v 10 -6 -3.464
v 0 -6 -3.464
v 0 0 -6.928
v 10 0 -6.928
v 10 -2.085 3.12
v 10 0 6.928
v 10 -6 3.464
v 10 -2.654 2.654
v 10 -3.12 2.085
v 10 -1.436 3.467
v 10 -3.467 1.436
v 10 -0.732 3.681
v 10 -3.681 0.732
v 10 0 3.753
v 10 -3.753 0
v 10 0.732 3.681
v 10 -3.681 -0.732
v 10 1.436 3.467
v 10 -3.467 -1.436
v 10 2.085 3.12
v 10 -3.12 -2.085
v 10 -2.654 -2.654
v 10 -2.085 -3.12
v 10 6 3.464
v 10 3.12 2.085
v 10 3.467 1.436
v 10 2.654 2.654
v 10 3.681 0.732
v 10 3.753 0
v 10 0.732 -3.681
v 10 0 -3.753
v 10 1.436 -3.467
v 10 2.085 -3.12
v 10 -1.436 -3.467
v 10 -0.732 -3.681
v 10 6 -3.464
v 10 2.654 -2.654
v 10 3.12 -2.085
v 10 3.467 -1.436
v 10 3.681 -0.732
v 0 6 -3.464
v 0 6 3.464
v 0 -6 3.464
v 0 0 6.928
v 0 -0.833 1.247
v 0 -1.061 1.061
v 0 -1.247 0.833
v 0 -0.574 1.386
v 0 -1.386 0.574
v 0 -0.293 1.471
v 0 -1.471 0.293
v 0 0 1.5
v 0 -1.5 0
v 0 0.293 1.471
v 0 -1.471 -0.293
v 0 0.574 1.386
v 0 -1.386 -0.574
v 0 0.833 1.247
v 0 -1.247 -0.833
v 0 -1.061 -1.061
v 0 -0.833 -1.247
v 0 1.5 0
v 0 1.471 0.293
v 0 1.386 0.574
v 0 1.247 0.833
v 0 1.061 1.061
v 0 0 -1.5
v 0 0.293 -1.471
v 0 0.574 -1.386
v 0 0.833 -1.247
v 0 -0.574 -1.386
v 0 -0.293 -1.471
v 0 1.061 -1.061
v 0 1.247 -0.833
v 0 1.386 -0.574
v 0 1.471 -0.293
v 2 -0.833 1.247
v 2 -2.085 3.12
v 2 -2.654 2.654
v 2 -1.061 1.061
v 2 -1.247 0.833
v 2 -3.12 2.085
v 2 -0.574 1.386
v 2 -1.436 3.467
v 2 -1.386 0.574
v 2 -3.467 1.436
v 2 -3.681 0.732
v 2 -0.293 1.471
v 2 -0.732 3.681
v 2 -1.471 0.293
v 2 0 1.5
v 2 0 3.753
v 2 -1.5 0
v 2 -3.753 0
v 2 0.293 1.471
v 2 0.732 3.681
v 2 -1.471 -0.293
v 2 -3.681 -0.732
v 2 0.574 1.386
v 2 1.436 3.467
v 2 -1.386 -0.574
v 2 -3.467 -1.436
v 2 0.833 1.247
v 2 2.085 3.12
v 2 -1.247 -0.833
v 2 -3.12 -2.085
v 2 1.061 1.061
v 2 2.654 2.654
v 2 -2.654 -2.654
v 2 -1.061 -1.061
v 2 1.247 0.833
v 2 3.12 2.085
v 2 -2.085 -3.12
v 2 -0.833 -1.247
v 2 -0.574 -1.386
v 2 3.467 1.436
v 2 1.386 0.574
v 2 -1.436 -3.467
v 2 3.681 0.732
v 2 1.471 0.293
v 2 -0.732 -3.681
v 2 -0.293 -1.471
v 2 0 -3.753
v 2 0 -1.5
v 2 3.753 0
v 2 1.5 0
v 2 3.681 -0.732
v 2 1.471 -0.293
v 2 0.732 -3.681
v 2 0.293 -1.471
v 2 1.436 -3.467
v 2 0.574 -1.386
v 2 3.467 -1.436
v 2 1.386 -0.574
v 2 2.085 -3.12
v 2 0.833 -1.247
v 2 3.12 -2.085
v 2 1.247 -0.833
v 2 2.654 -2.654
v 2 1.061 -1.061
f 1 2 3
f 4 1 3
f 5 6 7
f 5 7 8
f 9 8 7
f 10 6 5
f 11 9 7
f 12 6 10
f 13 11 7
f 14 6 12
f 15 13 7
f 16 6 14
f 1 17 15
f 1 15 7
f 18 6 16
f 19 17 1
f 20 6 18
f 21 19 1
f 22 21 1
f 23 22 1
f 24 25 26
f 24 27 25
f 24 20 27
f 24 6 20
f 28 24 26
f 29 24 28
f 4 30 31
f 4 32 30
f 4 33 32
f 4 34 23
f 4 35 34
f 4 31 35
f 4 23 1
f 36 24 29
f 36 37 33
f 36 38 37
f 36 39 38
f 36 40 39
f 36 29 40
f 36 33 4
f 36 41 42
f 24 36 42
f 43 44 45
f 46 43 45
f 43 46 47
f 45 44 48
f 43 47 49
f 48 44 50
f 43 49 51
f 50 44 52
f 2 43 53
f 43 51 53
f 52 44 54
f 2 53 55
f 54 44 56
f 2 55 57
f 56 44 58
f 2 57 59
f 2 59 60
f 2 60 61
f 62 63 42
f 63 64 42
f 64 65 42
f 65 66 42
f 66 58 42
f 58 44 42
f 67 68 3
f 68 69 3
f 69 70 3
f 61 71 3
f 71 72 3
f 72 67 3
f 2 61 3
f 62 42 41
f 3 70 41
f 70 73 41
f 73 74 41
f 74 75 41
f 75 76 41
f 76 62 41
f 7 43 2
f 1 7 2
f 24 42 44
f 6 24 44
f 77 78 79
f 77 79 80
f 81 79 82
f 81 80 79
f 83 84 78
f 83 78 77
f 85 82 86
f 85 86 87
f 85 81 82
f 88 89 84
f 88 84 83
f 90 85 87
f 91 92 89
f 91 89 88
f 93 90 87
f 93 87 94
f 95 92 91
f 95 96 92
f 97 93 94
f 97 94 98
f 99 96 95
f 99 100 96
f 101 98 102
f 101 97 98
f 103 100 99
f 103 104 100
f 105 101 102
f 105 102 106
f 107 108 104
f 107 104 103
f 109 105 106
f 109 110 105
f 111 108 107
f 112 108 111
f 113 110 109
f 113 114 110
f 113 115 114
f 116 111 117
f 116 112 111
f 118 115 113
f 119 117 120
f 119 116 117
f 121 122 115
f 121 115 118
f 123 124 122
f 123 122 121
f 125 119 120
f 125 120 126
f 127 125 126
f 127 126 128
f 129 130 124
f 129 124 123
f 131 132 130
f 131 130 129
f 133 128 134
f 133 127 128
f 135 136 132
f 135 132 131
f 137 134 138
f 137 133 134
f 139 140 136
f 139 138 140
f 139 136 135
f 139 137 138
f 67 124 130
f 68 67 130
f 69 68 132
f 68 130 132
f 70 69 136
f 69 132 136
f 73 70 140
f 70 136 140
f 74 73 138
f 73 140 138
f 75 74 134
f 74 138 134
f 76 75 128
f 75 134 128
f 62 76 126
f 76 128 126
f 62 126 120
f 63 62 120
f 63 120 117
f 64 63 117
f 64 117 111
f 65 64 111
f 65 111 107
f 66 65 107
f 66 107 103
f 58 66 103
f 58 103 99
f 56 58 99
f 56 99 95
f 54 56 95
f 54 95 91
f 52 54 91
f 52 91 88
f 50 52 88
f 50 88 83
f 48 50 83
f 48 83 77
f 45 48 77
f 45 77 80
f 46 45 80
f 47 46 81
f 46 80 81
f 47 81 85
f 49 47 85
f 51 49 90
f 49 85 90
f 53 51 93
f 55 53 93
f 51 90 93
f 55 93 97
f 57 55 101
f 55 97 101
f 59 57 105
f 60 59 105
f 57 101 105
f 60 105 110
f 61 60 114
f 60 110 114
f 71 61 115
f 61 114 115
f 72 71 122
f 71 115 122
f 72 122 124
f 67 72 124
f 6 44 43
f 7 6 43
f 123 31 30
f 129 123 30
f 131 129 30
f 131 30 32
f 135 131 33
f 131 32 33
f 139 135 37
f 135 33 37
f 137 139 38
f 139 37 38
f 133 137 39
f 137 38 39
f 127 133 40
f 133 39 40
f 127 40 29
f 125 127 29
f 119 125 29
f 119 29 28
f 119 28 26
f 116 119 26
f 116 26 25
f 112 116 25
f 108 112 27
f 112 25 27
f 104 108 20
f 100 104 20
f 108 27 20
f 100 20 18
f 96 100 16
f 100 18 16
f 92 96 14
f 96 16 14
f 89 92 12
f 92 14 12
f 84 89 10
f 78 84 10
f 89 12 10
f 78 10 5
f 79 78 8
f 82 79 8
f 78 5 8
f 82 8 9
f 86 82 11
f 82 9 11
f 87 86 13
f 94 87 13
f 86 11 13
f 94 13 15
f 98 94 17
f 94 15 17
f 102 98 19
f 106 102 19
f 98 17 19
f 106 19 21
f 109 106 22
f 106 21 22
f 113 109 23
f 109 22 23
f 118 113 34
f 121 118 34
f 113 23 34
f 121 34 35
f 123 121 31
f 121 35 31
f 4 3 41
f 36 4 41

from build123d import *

# Parameters (mm, degrees)
EXTRUDE_1_DEPTH     = 10
SKETCH_2_R          = 3.75277675
CUT_EXTRUDE_1_DEPTH = 8
SKETCH_3_R          = 1.5
CUT_EXTRUDE_2_DEPTH = 7


with BuildPart() as part:
    # 草图1 → 凸台-拉伸1 (new body)
    with BuildSketch(Plane(origin=(0, 0, 0), x_dir=(0, 0, -1), z_dir=(1, 0, 0))):
        Polygon((6.92820323, 0), (3.464101615, 6), (-3.464101615, 6), (-6.92820323, 0), (-3.464101615, -6), (3.464101615, -6), align=None)
    extrude(amount=EXTRUDE_1_DEPTH)

    # 草图2 → 切除-拉伸1 (cut)
    with BuildSketch(Plane(origin=(10, 0, 0), x_dir=(0, 0, -1), z_dir=(1, 0, 0))):
        Circle(SKETCH_2_R)
    extrude(amount=-CUT_EXTRUDE_1_DEPTH, mode=Mode.SUBTRACT)

    # 草图3 → 切除-拉伸2 (cut)
    with BuildSketch(Plane(origin=(2, 0, 0), x_dir=(0, 0, -1), z_dir=(1, 0, 0))):
        Circle(SKETCH_3_R)
    extrude(amount=-CUT_EXTRUDE_2_DEPTH, mode=Mode.SUBTRACT)


solid = part.part
